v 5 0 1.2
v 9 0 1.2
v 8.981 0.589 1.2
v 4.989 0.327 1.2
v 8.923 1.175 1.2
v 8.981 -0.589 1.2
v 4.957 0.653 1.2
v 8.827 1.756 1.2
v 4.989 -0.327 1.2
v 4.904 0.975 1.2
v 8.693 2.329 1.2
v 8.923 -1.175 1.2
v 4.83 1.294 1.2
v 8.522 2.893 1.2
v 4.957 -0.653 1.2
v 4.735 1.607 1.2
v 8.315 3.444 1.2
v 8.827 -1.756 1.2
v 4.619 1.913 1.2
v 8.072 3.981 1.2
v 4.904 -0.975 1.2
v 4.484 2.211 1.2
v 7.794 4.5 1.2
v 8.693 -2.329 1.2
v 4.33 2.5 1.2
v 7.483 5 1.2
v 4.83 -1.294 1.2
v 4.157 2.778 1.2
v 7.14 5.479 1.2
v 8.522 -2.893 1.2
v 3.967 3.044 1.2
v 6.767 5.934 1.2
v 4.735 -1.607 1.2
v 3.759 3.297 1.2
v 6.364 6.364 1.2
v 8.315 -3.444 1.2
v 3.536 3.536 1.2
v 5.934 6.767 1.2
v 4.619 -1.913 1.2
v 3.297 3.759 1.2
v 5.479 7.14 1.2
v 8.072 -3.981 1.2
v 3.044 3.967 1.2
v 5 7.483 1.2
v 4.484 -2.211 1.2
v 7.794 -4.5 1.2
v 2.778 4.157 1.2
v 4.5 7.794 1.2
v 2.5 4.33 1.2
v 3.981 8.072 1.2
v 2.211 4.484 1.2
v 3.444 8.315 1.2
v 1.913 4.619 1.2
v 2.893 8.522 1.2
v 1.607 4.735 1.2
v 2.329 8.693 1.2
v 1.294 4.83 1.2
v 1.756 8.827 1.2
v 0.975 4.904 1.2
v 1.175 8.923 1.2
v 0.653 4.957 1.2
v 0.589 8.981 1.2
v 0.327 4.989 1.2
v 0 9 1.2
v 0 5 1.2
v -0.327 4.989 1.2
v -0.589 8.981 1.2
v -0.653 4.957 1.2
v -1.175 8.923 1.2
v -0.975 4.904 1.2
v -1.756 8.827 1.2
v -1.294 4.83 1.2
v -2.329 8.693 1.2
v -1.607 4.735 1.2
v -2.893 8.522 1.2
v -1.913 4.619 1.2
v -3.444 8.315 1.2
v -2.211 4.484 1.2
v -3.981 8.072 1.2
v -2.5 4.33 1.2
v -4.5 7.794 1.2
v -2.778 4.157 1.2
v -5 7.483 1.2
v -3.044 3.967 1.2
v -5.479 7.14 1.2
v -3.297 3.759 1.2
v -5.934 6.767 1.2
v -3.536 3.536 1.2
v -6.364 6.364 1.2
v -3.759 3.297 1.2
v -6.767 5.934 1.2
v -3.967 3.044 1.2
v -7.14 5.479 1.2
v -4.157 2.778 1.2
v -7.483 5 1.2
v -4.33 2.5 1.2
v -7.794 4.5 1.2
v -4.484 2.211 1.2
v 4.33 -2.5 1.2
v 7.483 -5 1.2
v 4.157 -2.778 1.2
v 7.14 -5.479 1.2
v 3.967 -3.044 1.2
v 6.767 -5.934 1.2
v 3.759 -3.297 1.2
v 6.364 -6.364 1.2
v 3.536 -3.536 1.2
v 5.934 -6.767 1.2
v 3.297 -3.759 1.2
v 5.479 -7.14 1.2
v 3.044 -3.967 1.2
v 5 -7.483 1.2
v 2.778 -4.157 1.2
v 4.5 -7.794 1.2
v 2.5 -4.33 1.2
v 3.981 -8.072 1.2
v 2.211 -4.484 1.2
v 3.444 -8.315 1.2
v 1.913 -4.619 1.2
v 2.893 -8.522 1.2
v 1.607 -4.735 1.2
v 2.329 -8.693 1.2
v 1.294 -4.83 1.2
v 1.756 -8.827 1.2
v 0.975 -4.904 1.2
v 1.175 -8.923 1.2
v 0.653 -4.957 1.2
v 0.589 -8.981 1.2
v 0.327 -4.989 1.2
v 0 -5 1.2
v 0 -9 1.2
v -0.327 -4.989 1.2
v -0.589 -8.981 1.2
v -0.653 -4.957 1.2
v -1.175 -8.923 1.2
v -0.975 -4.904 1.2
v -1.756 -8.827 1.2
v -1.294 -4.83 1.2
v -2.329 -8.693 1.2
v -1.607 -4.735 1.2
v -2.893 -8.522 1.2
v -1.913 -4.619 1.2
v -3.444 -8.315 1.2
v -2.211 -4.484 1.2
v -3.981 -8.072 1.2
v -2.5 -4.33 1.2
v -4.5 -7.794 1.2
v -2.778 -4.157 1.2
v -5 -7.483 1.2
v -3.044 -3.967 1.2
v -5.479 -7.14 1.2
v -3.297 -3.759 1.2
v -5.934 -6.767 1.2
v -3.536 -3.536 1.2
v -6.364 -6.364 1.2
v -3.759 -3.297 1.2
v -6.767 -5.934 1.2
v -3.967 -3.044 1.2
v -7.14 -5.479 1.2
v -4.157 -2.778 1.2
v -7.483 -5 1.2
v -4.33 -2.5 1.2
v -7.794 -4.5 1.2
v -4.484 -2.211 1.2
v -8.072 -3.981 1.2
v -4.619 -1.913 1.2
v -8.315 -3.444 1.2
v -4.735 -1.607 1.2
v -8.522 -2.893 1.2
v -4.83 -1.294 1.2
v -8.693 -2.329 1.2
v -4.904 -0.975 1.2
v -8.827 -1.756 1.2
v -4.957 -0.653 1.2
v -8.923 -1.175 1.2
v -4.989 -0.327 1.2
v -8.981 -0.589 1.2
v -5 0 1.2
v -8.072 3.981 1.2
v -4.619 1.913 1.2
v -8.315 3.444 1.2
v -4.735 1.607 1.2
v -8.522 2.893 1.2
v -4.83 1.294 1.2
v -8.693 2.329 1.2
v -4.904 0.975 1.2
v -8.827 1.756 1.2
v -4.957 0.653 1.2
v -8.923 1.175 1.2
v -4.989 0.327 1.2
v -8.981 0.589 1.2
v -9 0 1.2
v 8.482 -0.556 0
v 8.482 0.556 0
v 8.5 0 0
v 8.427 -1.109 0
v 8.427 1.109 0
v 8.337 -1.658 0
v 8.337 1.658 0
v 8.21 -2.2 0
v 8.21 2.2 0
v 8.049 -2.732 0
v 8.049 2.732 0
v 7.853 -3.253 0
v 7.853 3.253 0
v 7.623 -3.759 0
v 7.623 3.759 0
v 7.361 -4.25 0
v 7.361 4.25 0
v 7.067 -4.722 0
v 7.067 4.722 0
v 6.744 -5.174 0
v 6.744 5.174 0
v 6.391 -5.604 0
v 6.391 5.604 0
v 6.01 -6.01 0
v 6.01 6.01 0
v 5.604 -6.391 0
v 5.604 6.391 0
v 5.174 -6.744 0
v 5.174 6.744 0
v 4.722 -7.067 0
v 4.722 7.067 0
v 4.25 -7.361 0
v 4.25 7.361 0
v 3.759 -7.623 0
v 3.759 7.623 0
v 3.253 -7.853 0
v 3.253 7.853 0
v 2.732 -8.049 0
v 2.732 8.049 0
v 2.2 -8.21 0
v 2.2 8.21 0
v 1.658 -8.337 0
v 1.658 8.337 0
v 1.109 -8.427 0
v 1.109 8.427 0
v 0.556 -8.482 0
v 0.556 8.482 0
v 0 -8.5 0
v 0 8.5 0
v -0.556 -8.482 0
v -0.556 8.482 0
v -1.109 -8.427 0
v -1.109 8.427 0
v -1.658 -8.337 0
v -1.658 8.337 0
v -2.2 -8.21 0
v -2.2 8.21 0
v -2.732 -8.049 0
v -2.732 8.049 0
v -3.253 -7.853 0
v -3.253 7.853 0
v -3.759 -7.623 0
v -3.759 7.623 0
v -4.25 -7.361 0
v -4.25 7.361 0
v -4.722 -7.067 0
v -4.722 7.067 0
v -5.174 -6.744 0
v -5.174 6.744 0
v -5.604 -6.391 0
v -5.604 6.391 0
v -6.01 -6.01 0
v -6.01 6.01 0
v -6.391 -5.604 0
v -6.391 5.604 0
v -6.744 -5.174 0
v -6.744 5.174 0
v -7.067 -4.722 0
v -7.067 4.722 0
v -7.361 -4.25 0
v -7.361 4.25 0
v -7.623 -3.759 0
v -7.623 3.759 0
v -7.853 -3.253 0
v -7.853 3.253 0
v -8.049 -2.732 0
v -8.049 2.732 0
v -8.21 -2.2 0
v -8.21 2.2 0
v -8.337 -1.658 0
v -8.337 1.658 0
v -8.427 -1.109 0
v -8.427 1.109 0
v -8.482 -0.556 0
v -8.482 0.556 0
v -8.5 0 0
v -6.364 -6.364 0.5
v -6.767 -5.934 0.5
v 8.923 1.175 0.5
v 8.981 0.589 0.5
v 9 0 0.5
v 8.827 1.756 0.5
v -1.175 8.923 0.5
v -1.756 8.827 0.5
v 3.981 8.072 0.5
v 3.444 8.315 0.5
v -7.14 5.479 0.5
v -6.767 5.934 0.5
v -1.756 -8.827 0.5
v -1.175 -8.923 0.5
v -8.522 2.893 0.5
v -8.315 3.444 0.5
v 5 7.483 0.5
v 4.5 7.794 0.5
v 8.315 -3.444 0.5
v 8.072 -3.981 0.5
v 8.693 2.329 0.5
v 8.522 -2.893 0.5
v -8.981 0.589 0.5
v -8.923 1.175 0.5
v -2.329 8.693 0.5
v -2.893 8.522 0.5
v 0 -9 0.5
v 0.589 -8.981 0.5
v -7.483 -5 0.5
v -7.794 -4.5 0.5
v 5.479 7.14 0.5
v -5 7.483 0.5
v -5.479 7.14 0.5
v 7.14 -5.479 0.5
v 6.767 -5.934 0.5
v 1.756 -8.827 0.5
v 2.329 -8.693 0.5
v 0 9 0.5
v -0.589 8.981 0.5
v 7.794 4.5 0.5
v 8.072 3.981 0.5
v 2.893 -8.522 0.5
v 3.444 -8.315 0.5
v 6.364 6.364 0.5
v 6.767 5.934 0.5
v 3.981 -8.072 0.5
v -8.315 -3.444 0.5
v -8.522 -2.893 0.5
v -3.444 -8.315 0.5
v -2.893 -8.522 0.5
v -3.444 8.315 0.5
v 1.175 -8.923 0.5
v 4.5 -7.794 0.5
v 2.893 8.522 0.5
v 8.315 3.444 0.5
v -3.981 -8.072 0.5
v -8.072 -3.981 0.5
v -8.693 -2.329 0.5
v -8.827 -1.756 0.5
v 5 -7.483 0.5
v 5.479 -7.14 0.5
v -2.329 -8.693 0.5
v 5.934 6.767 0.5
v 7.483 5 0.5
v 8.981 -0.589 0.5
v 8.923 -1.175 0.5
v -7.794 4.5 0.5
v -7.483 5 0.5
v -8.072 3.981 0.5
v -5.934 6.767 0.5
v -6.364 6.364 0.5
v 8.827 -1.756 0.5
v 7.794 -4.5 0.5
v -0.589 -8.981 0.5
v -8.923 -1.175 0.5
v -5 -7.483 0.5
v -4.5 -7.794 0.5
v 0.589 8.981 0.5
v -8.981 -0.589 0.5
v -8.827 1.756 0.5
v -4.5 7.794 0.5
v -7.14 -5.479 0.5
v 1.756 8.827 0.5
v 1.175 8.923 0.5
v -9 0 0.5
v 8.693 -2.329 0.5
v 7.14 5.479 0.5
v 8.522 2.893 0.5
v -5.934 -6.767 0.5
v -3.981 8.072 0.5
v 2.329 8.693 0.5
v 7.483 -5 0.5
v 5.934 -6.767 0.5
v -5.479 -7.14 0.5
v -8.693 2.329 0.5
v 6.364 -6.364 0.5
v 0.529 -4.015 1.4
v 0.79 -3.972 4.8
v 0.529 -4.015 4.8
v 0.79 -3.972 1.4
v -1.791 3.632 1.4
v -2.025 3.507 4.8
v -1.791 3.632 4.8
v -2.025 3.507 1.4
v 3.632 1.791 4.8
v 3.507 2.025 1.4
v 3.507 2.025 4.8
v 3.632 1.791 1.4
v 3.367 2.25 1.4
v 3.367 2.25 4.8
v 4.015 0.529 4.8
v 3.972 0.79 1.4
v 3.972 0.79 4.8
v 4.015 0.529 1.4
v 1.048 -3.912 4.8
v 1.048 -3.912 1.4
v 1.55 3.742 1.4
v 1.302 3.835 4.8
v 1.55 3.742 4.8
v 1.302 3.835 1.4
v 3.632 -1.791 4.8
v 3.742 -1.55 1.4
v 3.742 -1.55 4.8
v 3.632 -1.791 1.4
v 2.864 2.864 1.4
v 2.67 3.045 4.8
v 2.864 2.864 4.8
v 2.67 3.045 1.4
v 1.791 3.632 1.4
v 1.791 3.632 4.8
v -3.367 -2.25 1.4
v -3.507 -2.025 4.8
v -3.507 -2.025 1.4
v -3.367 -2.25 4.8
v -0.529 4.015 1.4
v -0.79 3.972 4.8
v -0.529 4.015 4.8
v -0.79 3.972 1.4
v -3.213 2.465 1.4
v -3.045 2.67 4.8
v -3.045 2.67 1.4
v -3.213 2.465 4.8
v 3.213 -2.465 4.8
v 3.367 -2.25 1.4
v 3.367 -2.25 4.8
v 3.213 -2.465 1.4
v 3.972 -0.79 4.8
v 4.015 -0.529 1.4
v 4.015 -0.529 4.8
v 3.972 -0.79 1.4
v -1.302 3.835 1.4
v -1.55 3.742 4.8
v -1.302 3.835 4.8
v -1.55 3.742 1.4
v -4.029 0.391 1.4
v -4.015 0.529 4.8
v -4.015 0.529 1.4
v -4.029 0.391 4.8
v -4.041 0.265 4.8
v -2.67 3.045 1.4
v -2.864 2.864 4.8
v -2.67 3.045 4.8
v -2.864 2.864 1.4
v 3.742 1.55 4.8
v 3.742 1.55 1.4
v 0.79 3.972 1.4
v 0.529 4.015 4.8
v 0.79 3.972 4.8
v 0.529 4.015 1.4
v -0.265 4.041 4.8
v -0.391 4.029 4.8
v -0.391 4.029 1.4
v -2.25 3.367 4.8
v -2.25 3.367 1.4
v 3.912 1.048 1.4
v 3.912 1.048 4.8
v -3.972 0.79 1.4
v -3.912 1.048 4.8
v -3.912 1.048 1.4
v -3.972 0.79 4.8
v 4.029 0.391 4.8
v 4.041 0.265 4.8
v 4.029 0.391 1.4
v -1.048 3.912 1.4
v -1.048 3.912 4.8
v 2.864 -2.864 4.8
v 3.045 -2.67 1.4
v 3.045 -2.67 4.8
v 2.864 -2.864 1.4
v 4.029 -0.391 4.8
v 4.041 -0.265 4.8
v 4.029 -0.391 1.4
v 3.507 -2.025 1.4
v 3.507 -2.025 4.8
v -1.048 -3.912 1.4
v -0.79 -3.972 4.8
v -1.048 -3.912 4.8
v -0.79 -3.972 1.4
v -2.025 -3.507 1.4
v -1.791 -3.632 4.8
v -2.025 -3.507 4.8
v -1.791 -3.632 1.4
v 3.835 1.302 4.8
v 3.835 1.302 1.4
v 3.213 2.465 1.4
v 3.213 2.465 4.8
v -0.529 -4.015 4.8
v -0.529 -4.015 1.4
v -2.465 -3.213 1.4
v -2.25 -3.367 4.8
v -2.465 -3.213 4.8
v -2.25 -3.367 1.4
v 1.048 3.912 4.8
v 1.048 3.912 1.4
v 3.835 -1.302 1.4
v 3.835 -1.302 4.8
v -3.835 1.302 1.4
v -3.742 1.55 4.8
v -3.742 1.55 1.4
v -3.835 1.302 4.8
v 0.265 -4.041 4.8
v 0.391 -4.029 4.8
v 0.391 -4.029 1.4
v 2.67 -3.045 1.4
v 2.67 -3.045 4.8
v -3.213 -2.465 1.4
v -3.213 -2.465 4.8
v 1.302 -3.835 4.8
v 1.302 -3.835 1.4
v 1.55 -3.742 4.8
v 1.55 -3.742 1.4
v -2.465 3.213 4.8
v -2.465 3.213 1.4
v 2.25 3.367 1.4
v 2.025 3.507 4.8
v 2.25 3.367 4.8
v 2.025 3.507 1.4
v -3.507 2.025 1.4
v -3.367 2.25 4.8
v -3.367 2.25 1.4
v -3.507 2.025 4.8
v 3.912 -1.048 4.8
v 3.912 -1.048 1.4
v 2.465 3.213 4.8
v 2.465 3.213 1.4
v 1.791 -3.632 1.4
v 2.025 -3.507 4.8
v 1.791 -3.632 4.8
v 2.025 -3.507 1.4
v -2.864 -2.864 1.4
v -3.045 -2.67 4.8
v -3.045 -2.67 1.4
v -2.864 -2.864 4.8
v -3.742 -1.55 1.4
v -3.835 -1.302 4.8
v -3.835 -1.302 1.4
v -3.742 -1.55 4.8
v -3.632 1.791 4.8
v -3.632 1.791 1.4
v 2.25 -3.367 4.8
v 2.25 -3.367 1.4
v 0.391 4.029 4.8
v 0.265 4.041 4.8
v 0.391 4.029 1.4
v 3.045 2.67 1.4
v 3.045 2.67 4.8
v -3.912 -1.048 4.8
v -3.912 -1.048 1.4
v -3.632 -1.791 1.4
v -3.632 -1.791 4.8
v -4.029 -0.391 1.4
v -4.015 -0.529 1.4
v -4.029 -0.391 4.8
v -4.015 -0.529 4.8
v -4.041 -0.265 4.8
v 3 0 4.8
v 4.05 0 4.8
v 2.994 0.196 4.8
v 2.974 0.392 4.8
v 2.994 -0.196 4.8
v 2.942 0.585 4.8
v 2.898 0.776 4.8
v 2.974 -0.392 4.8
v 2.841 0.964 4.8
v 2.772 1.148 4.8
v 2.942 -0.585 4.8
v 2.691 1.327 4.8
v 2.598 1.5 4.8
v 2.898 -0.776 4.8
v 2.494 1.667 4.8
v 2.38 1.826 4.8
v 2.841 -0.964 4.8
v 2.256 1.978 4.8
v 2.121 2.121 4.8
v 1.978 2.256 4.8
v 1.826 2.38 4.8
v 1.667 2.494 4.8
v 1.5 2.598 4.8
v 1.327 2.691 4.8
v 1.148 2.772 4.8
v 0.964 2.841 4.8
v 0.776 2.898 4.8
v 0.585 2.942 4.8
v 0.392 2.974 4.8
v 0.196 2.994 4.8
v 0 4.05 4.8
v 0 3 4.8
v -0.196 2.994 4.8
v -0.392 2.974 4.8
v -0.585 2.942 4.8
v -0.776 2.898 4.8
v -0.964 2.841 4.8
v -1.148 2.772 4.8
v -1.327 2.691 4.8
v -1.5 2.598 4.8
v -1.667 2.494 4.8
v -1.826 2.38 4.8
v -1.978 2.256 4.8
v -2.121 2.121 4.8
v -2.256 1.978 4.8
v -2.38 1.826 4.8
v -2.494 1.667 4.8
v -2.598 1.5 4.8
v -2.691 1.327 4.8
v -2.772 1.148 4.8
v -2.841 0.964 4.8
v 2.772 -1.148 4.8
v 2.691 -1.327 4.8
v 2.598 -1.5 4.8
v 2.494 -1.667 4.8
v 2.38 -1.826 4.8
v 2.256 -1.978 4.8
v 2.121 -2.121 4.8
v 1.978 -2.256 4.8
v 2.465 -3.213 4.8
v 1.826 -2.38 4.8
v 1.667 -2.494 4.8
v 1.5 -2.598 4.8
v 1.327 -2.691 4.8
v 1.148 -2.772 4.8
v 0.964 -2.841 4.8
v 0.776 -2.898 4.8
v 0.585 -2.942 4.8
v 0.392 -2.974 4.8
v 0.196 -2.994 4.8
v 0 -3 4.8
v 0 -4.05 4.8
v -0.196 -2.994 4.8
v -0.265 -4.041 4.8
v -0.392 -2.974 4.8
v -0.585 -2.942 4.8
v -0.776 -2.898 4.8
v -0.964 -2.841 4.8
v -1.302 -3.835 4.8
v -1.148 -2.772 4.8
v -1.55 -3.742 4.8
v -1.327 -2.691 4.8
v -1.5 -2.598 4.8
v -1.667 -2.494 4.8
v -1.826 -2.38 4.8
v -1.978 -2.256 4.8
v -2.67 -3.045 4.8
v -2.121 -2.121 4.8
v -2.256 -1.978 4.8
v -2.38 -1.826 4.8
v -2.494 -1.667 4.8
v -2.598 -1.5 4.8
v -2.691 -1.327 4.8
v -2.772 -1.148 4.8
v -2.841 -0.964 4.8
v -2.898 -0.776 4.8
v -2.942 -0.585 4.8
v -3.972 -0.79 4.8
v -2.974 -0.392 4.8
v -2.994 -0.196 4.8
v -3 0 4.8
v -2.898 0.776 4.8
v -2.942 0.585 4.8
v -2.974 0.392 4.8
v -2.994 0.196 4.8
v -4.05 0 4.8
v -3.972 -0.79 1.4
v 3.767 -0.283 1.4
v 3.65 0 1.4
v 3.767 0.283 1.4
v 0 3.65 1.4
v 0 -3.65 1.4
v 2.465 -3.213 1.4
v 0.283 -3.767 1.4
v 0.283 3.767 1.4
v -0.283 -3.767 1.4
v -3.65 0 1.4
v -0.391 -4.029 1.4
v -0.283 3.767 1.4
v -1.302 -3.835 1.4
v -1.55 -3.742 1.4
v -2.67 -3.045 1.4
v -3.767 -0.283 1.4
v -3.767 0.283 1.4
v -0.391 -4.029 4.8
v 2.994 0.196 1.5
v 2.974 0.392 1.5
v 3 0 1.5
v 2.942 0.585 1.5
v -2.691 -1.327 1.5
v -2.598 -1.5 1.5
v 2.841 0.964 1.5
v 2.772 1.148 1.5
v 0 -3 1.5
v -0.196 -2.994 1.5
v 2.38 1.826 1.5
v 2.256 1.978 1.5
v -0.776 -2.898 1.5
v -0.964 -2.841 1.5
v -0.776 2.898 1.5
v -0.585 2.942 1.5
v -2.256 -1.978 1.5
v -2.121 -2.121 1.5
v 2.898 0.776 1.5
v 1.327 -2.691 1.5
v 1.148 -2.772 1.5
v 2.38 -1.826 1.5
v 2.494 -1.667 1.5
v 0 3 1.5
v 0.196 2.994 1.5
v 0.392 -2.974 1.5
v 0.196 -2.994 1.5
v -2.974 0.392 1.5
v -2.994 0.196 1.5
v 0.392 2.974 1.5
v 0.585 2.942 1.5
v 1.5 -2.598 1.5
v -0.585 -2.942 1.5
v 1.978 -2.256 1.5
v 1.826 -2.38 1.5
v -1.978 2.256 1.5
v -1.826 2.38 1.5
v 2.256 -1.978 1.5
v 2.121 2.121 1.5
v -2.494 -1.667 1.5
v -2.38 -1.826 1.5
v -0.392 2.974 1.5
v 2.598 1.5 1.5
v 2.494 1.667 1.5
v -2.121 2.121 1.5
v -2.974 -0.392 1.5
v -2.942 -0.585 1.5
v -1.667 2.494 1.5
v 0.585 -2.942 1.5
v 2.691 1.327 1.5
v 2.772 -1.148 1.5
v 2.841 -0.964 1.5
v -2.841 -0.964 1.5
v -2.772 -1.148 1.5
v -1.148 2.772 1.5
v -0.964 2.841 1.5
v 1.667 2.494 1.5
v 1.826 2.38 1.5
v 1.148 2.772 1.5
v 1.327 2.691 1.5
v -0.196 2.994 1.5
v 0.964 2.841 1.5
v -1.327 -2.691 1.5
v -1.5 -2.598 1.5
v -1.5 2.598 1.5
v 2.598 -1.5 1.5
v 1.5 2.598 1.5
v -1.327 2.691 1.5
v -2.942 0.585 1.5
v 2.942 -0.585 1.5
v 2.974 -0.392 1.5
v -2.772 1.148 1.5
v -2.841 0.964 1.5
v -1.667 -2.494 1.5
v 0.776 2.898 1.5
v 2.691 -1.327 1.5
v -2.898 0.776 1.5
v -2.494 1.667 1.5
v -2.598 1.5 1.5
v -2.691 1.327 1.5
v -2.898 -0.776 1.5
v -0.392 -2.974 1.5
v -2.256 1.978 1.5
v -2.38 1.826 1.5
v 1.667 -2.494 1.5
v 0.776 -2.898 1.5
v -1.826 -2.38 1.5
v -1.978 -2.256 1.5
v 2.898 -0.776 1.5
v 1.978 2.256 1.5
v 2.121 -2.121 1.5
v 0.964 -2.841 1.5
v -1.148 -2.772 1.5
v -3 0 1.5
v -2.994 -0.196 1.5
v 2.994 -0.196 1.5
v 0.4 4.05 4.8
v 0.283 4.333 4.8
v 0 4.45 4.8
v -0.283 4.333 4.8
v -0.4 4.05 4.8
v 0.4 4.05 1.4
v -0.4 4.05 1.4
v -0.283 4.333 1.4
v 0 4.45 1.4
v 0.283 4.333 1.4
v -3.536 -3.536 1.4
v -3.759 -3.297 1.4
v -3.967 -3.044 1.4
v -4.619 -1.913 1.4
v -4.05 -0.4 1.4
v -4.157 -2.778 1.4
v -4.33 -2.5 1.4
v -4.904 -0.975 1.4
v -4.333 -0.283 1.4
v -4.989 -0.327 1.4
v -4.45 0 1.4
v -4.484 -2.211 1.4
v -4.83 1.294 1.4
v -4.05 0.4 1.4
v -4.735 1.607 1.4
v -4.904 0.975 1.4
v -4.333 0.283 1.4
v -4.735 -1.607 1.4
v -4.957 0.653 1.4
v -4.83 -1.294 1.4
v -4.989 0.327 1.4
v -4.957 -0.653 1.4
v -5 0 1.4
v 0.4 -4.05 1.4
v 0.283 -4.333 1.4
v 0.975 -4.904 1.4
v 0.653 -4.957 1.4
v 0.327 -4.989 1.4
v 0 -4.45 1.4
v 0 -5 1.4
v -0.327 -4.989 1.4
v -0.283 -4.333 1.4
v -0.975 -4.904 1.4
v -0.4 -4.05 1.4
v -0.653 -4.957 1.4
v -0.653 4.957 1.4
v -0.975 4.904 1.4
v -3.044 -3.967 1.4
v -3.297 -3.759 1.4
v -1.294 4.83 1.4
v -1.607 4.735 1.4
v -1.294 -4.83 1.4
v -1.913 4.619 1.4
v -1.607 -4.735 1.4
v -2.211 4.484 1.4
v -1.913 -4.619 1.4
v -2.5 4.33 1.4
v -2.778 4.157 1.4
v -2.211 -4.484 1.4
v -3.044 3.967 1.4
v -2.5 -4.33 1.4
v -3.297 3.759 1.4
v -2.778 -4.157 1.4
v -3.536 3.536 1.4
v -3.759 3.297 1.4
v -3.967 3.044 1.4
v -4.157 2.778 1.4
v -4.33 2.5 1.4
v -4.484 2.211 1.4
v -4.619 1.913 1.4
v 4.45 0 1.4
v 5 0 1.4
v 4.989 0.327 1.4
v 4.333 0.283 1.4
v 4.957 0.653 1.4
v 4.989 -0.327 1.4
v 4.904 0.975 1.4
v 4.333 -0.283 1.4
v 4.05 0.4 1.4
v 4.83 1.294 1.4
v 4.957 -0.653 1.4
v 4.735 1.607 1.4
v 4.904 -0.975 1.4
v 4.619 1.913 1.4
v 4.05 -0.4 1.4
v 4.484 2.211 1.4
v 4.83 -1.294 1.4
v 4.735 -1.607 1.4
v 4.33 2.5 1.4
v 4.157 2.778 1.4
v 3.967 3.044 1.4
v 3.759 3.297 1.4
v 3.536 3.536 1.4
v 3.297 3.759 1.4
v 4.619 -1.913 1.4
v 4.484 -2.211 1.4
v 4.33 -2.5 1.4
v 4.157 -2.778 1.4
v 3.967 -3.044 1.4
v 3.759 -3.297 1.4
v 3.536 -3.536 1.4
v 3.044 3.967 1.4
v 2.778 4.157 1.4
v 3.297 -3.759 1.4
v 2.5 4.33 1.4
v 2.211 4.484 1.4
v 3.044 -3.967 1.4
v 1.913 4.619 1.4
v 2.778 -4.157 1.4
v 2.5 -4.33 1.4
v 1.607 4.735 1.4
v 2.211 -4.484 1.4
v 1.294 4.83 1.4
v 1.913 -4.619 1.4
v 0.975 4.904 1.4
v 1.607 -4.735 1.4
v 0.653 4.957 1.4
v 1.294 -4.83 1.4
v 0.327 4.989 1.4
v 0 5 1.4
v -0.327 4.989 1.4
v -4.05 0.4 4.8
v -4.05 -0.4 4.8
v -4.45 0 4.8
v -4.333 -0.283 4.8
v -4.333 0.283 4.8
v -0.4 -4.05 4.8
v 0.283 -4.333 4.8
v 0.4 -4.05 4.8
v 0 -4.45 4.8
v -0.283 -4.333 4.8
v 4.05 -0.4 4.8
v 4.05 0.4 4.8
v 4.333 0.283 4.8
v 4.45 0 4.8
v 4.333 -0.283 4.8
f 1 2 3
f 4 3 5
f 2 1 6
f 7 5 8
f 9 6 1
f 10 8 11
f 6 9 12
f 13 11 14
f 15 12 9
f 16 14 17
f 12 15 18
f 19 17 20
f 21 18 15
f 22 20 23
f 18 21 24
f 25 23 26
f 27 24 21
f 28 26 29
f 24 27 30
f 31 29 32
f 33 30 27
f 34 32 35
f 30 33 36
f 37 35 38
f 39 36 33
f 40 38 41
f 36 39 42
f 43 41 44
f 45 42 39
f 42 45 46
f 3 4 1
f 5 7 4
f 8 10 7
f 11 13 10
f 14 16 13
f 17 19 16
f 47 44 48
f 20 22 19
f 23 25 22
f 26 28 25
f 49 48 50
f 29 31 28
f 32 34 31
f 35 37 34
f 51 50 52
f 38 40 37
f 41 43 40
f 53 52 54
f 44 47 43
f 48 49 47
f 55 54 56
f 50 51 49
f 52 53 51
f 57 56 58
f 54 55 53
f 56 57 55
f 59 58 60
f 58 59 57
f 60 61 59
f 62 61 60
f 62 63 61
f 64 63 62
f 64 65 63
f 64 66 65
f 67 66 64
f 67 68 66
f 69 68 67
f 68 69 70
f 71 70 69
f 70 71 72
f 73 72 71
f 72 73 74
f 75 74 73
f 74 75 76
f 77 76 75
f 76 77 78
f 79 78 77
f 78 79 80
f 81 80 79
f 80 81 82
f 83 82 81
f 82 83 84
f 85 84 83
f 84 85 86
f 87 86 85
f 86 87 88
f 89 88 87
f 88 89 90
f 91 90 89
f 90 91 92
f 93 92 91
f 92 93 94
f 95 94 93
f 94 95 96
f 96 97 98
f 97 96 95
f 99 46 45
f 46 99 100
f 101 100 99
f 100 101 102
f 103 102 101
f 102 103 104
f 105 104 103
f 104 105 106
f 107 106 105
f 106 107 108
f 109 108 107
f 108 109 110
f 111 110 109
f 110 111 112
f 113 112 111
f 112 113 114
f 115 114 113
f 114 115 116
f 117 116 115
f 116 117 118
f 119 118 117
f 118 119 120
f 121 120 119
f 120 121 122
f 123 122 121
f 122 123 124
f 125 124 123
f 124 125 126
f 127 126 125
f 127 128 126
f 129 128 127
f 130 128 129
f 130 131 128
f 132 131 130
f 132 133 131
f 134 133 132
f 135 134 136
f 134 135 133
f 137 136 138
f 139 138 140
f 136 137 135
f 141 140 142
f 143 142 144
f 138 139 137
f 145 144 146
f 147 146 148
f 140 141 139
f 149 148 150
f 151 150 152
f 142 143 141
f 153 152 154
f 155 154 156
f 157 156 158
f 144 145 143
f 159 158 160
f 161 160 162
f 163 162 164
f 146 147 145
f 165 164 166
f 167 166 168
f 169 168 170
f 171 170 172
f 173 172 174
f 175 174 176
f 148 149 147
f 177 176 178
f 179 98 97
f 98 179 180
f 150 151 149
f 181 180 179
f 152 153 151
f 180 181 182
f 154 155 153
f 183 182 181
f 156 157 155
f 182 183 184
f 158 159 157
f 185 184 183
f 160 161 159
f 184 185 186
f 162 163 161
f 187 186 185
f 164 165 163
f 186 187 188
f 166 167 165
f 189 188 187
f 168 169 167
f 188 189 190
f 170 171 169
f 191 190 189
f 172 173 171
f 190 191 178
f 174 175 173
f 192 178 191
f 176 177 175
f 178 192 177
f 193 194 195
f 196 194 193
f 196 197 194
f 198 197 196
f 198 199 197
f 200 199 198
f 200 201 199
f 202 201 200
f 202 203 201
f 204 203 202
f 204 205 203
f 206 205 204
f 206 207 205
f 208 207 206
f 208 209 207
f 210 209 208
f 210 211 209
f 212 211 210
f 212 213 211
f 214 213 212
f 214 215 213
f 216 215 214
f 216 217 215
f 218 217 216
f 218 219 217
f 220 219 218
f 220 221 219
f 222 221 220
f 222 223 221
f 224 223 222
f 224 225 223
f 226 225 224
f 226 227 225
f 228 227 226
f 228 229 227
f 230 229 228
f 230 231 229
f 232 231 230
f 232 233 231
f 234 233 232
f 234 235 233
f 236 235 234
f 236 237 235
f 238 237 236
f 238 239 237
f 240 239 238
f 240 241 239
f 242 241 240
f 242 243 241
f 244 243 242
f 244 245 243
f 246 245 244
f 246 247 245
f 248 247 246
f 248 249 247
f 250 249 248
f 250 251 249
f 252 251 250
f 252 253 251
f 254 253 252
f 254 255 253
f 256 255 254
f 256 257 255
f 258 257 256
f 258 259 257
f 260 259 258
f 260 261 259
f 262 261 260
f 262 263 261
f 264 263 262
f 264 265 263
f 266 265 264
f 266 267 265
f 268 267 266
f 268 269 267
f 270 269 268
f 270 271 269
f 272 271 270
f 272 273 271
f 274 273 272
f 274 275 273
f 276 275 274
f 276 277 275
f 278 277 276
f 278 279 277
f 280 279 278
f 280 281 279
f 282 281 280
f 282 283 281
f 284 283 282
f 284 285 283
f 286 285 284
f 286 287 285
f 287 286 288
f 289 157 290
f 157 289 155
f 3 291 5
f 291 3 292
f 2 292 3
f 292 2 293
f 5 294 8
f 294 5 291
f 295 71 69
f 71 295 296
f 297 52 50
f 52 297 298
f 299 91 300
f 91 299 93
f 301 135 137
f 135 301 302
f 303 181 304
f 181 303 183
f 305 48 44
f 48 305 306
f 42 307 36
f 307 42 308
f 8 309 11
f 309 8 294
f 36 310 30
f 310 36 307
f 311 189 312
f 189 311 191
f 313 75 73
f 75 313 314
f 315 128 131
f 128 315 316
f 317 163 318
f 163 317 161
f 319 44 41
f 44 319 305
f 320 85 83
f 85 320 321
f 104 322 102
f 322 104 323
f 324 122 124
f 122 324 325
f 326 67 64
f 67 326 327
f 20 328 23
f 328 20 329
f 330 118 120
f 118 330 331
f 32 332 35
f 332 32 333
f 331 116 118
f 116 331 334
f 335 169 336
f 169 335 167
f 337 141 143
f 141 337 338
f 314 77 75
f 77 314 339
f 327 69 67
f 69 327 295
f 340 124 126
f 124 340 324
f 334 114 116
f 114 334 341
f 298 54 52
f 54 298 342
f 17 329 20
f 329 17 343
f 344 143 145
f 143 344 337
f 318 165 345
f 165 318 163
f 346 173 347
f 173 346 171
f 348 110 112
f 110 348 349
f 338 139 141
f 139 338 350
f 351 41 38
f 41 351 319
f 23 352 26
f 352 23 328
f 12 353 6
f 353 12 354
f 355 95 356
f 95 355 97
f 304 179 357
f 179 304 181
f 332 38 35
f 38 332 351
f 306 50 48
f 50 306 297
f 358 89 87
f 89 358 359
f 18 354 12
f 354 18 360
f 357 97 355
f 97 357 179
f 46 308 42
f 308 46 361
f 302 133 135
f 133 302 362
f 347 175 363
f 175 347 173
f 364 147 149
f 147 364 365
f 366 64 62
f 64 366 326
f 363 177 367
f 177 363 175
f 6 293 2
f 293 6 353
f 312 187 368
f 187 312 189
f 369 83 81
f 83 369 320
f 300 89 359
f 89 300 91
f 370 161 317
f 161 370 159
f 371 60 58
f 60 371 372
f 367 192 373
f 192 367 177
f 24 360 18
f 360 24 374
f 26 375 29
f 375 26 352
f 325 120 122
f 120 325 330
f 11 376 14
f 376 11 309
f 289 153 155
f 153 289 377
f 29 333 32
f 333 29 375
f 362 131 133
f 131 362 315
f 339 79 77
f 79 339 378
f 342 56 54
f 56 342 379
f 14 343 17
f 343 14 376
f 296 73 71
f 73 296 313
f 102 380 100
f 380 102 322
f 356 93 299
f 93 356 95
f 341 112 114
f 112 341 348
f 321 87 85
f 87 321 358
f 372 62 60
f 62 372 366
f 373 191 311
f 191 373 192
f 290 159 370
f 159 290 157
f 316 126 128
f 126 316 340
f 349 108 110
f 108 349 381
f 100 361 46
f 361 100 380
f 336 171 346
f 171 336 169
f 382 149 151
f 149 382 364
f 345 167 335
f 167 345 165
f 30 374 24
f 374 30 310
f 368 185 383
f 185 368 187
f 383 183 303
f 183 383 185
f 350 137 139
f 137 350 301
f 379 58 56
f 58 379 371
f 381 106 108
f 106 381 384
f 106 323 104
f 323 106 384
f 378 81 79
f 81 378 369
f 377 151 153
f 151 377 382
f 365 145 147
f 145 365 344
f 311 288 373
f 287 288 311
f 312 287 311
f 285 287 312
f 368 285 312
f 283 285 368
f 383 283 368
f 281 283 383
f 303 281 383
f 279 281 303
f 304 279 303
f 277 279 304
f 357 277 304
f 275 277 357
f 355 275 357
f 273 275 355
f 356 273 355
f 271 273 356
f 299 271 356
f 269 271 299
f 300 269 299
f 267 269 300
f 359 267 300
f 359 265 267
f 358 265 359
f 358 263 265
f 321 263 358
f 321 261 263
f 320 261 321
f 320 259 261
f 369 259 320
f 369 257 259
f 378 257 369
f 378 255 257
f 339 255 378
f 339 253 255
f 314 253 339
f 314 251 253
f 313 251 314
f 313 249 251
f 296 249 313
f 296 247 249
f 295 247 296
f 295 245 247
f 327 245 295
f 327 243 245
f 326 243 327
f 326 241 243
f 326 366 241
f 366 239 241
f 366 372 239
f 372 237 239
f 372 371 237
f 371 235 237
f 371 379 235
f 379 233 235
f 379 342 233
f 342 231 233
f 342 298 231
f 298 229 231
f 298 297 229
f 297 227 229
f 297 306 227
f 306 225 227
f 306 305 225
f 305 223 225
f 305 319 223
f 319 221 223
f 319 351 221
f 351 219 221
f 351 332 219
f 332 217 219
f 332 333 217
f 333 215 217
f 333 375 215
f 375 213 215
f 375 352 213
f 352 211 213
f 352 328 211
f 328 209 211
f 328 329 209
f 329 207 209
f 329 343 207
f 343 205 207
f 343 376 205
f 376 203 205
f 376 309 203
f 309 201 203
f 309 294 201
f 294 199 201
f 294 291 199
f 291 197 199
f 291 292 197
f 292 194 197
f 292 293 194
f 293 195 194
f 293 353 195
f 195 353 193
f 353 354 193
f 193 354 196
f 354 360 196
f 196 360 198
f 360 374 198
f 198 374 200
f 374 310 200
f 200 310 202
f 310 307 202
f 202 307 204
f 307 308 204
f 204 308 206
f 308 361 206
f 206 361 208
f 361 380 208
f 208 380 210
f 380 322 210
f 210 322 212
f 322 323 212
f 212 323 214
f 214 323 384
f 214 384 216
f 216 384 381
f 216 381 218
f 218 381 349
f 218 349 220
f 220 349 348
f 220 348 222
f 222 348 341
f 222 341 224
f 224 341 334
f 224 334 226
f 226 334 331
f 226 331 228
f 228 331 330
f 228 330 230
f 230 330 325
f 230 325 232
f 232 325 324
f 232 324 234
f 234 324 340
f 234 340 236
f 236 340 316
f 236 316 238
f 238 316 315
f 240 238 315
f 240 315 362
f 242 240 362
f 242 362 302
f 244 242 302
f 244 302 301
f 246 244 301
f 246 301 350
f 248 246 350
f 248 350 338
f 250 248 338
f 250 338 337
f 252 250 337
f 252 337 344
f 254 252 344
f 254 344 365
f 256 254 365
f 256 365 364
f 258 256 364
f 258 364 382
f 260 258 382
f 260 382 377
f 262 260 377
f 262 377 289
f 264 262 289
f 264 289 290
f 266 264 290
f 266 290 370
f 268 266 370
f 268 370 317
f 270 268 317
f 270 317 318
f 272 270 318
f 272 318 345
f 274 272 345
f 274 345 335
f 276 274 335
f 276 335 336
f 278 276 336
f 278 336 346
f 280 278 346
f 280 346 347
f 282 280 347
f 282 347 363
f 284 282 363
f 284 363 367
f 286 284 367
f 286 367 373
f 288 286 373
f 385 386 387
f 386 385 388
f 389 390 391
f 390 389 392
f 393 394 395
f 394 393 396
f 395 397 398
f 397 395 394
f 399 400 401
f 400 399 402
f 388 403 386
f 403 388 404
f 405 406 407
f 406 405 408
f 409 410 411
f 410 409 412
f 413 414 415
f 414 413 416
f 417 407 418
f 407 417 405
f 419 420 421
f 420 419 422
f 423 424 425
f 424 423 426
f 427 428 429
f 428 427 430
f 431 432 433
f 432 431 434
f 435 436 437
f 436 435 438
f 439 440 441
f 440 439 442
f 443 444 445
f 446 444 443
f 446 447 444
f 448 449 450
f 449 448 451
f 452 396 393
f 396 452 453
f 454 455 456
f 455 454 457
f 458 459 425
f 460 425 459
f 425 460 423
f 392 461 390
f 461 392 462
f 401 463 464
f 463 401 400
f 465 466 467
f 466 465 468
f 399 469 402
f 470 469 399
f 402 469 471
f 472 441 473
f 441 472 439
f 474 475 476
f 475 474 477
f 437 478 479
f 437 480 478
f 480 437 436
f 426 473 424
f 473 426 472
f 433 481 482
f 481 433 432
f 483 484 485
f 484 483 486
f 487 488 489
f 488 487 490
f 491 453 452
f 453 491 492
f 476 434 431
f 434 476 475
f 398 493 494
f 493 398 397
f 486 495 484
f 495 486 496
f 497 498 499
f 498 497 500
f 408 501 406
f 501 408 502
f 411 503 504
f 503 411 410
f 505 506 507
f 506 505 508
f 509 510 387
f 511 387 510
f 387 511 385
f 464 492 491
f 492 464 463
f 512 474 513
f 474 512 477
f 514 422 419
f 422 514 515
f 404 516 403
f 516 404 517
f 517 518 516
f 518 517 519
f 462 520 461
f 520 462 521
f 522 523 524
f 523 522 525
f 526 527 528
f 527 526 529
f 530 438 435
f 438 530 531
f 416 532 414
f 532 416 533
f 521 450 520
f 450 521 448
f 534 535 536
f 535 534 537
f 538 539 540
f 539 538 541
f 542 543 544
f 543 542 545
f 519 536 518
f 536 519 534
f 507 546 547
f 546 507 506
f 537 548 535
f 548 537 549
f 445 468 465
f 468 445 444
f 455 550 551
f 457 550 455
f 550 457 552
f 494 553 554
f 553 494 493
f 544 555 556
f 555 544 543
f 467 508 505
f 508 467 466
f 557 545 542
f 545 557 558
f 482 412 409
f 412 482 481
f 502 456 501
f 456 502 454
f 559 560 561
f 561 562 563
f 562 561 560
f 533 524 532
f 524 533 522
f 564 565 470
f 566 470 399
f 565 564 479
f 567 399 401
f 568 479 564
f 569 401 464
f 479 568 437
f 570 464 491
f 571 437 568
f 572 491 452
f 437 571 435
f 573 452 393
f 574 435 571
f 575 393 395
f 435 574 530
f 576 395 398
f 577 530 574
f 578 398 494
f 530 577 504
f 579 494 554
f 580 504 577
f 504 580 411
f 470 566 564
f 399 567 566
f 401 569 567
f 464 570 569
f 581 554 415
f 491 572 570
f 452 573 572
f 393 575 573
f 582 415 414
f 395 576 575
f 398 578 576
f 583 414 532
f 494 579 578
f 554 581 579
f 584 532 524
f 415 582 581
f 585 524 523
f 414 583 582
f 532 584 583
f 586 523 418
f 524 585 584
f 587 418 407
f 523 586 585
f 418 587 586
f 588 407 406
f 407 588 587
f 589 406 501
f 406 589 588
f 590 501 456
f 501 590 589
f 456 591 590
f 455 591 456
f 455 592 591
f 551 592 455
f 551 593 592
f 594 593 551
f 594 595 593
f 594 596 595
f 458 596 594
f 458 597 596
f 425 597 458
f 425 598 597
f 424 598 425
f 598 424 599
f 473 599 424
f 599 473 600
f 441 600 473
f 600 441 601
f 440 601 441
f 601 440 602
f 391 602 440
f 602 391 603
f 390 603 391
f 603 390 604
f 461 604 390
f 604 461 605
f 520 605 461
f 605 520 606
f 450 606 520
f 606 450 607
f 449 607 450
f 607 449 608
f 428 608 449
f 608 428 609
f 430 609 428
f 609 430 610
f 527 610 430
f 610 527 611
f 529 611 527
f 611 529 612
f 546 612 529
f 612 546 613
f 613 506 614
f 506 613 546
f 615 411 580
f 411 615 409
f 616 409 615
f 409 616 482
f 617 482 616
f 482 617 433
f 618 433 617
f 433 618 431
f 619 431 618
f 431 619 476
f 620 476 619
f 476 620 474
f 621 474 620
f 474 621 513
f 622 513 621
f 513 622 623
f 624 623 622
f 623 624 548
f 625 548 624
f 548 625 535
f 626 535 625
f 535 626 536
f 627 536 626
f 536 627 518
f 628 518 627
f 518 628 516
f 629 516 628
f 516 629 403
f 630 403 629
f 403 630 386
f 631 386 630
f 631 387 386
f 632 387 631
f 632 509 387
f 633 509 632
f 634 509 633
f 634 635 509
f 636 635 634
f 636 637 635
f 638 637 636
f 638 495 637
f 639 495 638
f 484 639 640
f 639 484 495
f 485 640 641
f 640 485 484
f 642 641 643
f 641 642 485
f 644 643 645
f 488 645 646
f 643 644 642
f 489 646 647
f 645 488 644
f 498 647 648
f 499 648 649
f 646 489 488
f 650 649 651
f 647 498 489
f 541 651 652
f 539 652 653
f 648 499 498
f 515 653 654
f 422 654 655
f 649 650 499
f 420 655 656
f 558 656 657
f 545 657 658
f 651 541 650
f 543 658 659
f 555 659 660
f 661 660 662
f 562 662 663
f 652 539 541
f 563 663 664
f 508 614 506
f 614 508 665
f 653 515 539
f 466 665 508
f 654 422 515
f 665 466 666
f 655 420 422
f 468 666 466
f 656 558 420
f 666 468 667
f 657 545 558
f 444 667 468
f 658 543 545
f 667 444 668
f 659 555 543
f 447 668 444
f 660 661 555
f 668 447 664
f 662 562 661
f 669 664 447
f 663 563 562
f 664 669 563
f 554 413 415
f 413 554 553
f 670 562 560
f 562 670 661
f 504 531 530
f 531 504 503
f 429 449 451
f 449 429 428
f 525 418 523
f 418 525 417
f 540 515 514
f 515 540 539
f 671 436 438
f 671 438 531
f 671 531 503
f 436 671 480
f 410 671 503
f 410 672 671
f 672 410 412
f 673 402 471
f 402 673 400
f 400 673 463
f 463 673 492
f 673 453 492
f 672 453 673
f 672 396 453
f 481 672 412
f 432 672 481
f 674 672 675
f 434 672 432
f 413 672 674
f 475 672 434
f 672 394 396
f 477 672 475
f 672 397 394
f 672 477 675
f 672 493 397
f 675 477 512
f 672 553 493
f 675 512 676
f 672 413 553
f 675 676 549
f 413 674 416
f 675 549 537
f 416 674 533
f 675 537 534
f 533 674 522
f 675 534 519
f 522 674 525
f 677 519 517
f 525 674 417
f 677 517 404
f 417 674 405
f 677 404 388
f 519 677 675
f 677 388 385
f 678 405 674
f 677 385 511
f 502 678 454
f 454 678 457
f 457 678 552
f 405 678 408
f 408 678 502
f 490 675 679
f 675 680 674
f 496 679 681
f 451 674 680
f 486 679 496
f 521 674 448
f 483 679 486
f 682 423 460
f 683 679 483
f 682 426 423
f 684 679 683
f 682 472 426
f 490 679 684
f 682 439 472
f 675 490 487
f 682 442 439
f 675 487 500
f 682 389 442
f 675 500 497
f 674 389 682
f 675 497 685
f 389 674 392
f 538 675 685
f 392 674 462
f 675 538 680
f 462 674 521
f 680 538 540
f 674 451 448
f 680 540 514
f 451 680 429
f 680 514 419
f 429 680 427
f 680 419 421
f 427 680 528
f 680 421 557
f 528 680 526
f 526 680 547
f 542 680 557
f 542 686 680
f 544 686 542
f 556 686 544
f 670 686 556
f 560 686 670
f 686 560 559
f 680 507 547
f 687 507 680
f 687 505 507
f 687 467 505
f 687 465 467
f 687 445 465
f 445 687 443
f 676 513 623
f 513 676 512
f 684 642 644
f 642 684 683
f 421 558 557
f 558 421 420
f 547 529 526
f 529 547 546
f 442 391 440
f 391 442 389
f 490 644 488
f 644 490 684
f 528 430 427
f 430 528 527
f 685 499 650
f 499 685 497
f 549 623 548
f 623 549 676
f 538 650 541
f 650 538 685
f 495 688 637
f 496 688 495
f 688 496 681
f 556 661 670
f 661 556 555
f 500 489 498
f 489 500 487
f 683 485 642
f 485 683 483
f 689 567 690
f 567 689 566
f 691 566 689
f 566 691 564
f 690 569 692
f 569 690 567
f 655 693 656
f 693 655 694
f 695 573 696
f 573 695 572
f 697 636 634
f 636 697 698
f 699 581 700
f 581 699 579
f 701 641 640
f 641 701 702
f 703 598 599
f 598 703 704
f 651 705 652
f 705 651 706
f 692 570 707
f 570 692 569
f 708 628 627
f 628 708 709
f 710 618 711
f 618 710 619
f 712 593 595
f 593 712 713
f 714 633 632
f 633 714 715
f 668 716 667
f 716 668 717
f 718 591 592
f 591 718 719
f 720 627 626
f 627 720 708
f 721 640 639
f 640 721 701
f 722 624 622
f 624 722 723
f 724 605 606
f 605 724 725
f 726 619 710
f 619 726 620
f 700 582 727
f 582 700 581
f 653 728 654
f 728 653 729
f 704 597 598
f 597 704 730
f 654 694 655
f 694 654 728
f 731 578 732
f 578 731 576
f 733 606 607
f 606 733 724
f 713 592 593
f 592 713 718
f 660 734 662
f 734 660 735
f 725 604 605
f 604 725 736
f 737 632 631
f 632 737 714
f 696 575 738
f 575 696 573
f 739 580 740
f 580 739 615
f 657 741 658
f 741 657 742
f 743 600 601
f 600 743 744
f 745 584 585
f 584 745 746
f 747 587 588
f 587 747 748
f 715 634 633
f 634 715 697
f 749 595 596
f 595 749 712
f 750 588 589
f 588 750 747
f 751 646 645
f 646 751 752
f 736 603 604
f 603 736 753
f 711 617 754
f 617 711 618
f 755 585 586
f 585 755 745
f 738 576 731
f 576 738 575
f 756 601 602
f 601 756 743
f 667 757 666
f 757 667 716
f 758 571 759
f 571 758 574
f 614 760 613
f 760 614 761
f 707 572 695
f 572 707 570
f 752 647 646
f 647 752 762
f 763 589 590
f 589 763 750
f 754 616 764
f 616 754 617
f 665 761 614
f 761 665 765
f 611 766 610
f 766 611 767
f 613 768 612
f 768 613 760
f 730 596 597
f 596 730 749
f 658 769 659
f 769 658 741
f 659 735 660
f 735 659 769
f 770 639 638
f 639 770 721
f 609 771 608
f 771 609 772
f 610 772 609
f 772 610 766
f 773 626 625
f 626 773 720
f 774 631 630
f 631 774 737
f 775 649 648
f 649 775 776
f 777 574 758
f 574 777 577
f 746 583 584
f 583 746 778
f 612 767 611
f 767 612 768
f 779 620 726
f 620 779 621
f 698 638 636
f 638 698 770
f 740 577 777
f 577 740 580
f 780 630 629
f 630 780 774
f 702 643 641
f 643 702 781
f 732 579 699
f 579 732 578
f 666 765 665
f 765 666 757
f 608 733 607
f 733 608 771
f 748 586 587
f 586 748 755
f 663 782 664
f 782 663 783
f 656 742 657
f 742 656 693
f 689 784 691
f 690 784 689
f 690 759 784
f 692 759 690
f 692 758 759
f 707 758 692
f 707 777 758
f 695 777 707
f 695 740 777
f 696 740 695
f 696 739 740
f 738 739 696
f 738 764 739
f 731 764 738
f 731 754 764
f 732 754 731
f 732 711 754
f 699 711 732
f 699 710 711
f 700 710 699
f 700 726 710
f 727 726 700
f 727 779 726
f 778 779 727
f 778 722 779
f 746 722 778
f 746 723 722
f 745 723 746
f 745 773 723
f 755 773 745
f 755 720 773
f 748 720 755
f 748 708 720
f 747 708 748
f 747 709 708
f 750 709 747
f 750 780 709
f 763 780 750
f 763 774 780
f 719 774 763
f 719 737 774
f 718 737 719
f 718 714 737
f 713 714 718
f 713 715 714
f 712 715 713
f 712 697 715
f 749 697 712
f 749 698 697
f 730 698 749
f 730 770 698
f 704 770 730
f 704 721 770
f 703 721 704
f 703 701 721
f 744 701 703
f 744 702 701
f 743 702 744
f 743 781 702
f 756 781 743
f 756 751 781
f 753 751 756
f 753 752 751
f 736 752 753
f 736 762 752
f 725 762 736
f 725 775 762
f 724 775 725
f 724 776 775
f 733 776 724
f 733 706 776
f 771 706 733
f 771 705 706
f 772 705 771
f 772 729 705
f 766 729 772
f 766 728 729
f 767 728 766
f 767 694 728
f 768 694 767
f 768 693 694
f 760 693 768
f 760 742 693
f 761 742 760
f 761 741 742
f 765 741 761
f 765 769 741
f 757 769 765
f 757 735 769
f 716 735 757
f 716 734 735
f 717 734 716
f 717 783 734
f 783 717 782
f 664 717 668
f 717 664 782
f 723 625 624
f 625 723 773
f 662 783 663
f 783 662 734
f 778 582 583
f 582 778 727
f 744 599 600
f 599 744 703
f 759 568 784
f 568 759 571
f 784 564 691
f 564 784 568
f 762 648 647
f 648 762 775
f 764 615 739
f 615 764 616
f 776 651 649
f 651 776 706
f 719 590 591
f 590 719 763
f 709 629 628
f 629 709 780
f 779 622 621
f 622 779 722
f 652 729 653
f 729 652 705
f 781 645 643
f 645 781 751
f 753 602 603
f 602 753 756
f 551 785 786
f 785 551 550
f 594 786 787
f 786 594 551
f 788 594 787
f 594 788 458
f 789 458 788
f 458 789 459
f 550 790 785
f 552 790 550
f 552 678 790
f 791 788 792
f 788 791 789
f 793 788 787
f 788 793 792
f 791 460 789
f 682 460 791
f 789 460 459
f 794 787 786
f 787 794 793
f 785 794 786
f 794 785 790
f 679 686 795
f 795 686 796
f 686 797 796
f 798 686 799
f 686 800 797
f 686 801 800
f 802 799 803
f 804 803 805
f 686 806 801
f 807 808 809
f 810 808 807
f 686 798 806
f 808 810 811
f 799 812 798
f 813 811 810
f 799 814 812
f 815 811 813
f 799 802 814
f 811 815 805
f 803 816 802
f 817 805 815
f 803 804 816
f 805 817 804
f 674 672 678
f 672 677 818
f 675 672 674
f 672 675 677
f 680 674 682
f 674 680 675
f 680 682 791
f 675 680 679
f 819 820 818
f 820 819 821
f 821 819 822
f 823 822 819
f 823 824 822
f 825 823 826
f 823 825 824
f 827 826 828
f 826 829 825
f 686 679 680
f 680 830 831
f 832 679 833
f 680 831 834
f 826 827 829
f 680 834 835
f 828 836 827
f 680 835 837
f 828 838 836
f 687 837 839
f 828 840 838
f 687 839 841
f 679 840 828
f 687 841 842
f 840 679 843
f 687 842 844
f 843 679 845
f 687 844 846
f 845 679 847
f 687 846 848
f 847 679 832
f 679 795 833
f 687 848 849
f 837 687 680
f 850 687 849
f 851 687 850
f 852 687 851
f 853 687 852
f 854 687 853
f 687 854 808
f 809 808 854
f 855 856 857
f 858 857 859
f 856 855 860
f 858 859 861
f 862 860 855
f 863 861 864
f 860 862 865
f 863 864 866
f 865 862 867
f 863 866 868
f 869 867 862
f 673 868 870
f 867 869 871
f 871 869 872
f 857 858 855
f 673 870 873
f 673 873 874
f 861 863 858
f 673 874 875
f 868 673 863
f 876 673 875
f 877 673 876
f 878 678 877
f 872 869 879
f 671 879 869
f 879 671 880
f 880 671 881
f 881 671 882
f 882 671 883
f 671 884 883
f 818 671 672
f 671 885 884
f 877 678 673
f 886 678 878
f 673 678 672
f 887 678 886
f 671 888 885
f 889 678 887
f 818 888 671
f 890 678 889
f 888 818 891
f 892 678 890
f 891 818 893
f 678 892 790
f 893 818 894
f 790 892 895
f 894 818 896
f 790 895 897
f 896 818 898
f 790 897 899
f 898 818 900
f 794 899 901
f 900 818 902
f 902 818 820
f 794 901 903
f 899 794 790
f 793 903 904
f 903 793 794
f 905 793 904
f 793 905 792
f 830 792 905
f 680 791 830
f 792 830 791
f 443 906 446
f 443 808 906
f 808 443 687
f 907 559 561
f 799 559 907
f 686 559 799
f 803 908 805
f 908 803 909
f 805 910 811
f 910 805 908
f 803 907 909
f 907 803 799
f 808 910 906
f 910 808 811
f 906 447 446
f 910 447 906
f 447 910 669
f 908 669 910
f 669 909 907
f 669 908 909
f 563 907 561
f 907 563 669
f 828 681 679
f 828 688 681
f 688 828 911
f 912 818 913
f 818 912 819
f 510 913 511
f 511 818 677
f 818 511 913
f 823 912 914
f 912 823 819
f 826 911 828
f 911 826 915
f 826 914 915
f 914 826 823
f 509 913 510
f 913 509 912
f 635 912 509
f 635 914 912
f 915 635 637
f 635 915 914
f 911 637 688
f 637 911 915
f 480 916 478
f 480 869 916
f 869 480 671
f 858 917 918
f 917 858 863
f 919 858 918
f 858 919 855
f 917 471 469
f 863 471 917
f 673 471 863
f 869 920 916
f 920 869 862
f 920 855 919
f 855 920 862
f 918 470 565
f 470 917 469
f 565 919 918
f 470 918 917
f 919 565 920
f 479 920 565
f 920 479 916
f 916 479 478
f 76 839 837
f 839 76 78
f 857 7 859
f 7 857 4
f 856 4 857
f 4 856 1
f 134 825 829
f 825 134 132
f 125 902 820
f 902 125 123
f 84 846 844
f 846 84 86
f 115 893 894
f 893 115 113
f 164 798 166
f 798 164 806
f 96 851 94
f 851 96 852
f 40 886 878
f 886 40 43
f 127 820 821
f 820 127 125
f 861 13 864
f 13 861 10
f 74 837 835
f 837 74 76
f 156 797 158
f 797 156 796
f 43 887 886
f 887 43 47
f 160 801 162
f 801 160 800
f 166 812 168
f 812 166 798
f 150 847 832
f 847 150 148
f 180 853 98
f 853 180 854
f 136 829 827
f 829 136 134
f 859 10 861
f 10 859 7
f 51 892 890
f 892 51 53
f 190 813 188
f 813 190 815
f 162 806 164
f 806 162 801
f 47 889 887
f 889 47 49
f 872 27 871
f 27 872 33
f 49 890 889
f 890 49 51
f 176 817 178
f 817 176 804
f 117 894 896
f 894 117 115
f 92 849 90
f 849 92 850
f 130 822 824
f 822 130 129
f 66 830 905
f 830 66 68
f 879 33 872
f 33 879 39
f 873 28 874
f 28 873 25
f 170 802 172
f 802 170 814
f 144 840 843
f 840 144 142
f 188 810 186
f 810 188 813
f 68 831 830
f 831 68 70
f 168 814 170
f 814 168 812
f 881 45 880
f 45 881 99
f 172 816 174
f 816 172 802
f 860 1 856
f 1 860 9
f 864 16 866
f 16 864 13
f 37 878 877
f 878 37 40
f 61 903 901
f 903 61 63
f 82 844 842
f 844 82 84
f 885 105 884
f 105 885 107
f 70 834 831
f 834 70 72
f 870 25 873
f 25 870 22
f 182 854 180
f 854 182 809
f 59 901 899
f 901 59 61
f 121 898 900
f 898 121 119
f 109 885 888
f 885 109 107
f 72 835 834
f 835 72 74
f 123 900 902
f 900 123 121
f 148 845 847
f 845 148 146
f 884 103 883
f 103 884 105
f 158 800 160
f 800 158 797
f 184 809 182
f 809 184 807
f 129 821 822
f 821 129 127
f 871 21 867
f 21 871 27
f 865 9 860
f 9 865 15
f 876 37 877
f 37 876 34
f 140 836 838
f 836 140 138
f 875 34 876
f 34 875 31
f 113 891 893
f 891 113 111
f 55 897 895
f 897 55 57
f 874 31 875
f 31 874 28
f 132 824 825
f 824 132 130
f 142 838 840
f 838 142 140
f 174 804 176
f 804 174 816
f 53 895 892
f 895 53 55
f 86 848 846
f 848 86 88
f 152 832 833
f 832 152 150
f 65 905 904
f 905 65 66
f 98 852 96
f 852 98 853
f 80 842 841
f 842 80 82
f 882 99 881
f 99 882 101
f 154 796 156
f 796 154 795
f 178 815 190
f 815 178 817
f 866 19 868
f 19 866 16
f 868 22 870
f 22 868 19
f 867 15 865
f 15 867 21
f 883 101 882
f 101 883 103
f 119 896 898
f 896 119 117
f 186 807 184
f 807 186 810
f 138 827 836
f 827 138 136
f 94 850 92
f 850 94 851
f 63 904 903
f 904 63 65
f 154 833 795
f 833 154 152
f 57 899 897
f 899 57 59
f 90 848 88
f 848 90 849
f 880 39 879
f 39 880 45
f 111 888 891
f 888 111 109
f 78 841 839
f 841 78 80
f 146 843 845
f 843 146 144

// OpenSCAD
// file: shapes/inverted_chamfer_cylinder.scad
use <torus.scad>;

inverted_chamfer_cylinder();

module inverted_chamfer_cylinder(
    h = 10, 
    r = 5, 
    chamfer_radius = 1,
    extra_margin_bottom = 1,
    extra_margin_top = 1)
{    
    chamfer_diameter = chamfer_radius * 2;
    
    union()
    {
        translate([0, 0, h-chamfer_radius])
        hull()
        {            
            inverted_chamfer_rim_top();    
            
            translate([0,0,chamfer_radius])
            cylinder(
                h = extra_margin_top,
                r = r + chamfer_radius);
        }
        
        cylinder(h=h, r=r);
        
        hull()
        {            
            inverted_chamfer_rim_bottom();
            translate([0,0,-extra_margin_bottom])
            cylinder(
                h = extra_margin_bottom,
                r = r + chamfer_radius);
        }
    }
    
    module inverted_chamfer_rim_top()
    {
        difference()
        {
            inverted_chamfer_torus();
            
            translate([0,0,chamfer_radius])
            cylinder(
                h = chamfer_radius,
                r = r + chamfer_radius);
        }
    }
    
    module inverted_chamfer_rim_bottom()
    {
        translate([0,0,-chamfer_radius])
        difference()
        {
            inverted_chamfer_torus();
            
            cylinder(
                h = chamfer_radius,
                r = r + chamfer_radius);
        }
    }
    
    module inverted_chamfer_torus()
    {
        torus(h = chamfer_diameter, r = r + chamfer_radius, sides = 4);
    }
}
// file: shapes/chamfer_cylinder.scad
use <torus.scad>;

chamfer_cylinder();

module chamfer_cylinder(
    h = 10, 
    r = 5, 
    chamfer_radius = 1)
{
    chamfer_diameter = chamfer_radius * 2;
    union()
    {
        translate([0, 0, h-chamfer_diameter])
        chamfer_torus();    
        
        cylinder(
            h = h, 
            r = r - chamfer_radius);
        
        translate([0, 0, chamfer_radius])
        cylinder(
            h = h - (chamfer_radius * 2), 
            r = r);
        
        chamfer_torus();
    }
    
    module chamfer_torus()
    {
        torus(h = chamfer_diameter, r = r, sides = 4);
    }
}
// file: shapes/torus.scad
torus();

module torus(
    h = 2,     
    r = 10,   
    sides = $fn)
{
    tube_radius = h / 2;
    inside_radius = r - tube_radius;
    //translate([r,r,thickness_radius])
    translate([0,0,tube_radius])
    rotate_extrude()
    translate([inside_radius, 0, 0])
    circle(r = tube_radius, $fn = sides);
}
// file: shapes/bearing_race.scad
use <bearing_race_hole.scad>;

bearing_race();

module bearing_race(
    h = 10, 
    id = 28,
    od = 30,
    spline_qty = 8,
    spline_depth = 1)
{
    difference()
    {
        cylinder(
            h = h, 
            r = od / 2);
        
        bearing_race_hole(
            h = h,
            r = id / 2,
            spline_qty = spline_qty,
            spline_depth = spline_depth
        );
    }    
}
// file: shapes/bearing_race_hole.scad
use <bearing_race_spline.scad>;

bearing_race_hole();

module bearing_race_hole(
    h = 10, 
    r = 22,
    spline_qty = 4,
    spline_depth = 1,
    extra_margin_bottom = 1,
    extra_margin_top = 1)
{
    difference()
    {
        translate([0, 0, -extra_margin_bottom])
        cylinder(
            h = h + extra_margin_bottom + extra_margin_top, 
            r = r);
        
        rotate([0, 0, 360 / spline_qty / 2])
        splines();
    }
    
    module splines()
    {        
        for (i = [1:spline_qty])
        {
            angle = i * (360 / spline_qty);
            rotate([0, 0, angle])
            translate([r, 0, 0])
            bearing_race_spline(
                h = h, 
                r = spline_depth, 
                taper = h / 4, 
                $fn = 8);
        }        
    }
}
// file: shapes/bearing_race_spline.scad
bearing_race_spline();

module bearing_race_spline(
    h = 10, 
    r = 1,
    taper = 2.5)
{
    cylinder_height = h - (taper * 2);
    
    translate([0,0,taper + cylinder_height])
    cylinder(h = taper, r1 = r, r2 = 0);
    
    translate([0,0,taper])
    cylinder(h = cylinder_height, r = r);
    
    cylinder(h = taper, r1 = 0, r2 = r);
}
// file: shapes/shapes.lib.scad
use <bearing_race_spline.scad>;
use <bearing_race_hole.scad>;
use <bearing_race.scad>;
use <torus.scad>;
use <chamfer_cylinder.scad>;
use <inverted_chamfer_cylinder.scad>;
// file: knob.scad
include <shapes/shapes.lib.scad>;

$fn = 96;

knob();

module knob(
    knob_diameter = 28,
    knob_thickness = 1.5, 
    chamfer_radius = 0.5,
    bearing_diameter = 10,
    bearing_clearance = 0.2,
    stem_depth = 5,   
    stem_bore = 8, 
    shoulder_height = 0.2,
    shoulder_diameter = 15,
    spline_qty = 4,
    spline_depth = 0.4)
{
    bearing_radius = bearing_diameter / 2;
    knob_radius = knob_diameter / 2;

    shoulder_radius = shoulder_diameter / 2;
    shoulder_z = knob_thickness; 

    stem_z = knob_thickness + shoulder_height;
    stem_radius = (bearing_diameter - bearing_clearance) /2;

    // knob outside
    chamfer_cylinder(
        h = knob_thickness, 
        r = knob_radius , 
        chamfer_radius = chamfer_radius);

    // knob inside
    translate([0, 0, chamfer_radius])
    cylinder(
        r = knob_radius,
        h = knob_thickness - chamfer_radius);

    // stem
    translate([0, 0, stem_z])
    stem();

    // shoulder
    translate([0, 0, shoulder_z])
    cylinder(
        h = shoulder_height,
        r = shoulder_radius);

    // splines
    splines();

    module stem()
    {
        stem_bore_radius = stem_bore / 2;
        difference()
        {
            cylinder(
                h = stem_depth,
                r = stem_radius);

            translate([0,0,0.1])
            cylinder(
                h = stem_depth + 0.2,
                r = stem_bore_radius);
        }
    }

    module splines()
    {        
        spline_z = knob_thickness + shoulder_height;
        spline_h = stem_depth;
        spline_taper = 0;

        for (i = [1:spline_qty])
        {
            angle = i * (360 / spline_qty);
            rotate([0,0,angle])
            translate([stem_radius, 0, spline_z])
            bearing_race_spline(
                h = spline_h, 
                r = spline_depth, 
                taper = spline_taper, 
                $fn = 8);
        }
    }
}
// file: spinner.608.settings.scad
default_outer_diameter = 28;
default_legs = 4;
default_chamfer_radius = 2;
default_fillet_radius = 5;

// 608 bearing dimensions
default_bearing_height = 7; // "slim"
default_bearing_diameter = 22;
default_bearing_clearance = 0.5;
default_spline_qty = 10;
default_spline_radius = default_bearing_clearance;
default_bearing_inner_diameter = 8;
// main file
include <spinner.608.settings.scad>;
use <knob.scad>;

knob_608();

module knob_608(
    knob_diameter = default_bearing_diameter - 4,
    knob_thickness = 1.2,
    shoulder_height = 0.2)
{
    knob(
      knob_diameter = knob_diameter,
      knob_thickness = knob_thickness,
      bearing_diameter = default_bearing_inner_diameter,
      bearing_clearance = -0.1,
      stem_depth = 3.4,
      stem_bore = 6,
      spline_qty = 4,
      shoulder_height = shoulder_height,
      shoulder_diameter = default_bearing_inner_diameter + 2);
}
